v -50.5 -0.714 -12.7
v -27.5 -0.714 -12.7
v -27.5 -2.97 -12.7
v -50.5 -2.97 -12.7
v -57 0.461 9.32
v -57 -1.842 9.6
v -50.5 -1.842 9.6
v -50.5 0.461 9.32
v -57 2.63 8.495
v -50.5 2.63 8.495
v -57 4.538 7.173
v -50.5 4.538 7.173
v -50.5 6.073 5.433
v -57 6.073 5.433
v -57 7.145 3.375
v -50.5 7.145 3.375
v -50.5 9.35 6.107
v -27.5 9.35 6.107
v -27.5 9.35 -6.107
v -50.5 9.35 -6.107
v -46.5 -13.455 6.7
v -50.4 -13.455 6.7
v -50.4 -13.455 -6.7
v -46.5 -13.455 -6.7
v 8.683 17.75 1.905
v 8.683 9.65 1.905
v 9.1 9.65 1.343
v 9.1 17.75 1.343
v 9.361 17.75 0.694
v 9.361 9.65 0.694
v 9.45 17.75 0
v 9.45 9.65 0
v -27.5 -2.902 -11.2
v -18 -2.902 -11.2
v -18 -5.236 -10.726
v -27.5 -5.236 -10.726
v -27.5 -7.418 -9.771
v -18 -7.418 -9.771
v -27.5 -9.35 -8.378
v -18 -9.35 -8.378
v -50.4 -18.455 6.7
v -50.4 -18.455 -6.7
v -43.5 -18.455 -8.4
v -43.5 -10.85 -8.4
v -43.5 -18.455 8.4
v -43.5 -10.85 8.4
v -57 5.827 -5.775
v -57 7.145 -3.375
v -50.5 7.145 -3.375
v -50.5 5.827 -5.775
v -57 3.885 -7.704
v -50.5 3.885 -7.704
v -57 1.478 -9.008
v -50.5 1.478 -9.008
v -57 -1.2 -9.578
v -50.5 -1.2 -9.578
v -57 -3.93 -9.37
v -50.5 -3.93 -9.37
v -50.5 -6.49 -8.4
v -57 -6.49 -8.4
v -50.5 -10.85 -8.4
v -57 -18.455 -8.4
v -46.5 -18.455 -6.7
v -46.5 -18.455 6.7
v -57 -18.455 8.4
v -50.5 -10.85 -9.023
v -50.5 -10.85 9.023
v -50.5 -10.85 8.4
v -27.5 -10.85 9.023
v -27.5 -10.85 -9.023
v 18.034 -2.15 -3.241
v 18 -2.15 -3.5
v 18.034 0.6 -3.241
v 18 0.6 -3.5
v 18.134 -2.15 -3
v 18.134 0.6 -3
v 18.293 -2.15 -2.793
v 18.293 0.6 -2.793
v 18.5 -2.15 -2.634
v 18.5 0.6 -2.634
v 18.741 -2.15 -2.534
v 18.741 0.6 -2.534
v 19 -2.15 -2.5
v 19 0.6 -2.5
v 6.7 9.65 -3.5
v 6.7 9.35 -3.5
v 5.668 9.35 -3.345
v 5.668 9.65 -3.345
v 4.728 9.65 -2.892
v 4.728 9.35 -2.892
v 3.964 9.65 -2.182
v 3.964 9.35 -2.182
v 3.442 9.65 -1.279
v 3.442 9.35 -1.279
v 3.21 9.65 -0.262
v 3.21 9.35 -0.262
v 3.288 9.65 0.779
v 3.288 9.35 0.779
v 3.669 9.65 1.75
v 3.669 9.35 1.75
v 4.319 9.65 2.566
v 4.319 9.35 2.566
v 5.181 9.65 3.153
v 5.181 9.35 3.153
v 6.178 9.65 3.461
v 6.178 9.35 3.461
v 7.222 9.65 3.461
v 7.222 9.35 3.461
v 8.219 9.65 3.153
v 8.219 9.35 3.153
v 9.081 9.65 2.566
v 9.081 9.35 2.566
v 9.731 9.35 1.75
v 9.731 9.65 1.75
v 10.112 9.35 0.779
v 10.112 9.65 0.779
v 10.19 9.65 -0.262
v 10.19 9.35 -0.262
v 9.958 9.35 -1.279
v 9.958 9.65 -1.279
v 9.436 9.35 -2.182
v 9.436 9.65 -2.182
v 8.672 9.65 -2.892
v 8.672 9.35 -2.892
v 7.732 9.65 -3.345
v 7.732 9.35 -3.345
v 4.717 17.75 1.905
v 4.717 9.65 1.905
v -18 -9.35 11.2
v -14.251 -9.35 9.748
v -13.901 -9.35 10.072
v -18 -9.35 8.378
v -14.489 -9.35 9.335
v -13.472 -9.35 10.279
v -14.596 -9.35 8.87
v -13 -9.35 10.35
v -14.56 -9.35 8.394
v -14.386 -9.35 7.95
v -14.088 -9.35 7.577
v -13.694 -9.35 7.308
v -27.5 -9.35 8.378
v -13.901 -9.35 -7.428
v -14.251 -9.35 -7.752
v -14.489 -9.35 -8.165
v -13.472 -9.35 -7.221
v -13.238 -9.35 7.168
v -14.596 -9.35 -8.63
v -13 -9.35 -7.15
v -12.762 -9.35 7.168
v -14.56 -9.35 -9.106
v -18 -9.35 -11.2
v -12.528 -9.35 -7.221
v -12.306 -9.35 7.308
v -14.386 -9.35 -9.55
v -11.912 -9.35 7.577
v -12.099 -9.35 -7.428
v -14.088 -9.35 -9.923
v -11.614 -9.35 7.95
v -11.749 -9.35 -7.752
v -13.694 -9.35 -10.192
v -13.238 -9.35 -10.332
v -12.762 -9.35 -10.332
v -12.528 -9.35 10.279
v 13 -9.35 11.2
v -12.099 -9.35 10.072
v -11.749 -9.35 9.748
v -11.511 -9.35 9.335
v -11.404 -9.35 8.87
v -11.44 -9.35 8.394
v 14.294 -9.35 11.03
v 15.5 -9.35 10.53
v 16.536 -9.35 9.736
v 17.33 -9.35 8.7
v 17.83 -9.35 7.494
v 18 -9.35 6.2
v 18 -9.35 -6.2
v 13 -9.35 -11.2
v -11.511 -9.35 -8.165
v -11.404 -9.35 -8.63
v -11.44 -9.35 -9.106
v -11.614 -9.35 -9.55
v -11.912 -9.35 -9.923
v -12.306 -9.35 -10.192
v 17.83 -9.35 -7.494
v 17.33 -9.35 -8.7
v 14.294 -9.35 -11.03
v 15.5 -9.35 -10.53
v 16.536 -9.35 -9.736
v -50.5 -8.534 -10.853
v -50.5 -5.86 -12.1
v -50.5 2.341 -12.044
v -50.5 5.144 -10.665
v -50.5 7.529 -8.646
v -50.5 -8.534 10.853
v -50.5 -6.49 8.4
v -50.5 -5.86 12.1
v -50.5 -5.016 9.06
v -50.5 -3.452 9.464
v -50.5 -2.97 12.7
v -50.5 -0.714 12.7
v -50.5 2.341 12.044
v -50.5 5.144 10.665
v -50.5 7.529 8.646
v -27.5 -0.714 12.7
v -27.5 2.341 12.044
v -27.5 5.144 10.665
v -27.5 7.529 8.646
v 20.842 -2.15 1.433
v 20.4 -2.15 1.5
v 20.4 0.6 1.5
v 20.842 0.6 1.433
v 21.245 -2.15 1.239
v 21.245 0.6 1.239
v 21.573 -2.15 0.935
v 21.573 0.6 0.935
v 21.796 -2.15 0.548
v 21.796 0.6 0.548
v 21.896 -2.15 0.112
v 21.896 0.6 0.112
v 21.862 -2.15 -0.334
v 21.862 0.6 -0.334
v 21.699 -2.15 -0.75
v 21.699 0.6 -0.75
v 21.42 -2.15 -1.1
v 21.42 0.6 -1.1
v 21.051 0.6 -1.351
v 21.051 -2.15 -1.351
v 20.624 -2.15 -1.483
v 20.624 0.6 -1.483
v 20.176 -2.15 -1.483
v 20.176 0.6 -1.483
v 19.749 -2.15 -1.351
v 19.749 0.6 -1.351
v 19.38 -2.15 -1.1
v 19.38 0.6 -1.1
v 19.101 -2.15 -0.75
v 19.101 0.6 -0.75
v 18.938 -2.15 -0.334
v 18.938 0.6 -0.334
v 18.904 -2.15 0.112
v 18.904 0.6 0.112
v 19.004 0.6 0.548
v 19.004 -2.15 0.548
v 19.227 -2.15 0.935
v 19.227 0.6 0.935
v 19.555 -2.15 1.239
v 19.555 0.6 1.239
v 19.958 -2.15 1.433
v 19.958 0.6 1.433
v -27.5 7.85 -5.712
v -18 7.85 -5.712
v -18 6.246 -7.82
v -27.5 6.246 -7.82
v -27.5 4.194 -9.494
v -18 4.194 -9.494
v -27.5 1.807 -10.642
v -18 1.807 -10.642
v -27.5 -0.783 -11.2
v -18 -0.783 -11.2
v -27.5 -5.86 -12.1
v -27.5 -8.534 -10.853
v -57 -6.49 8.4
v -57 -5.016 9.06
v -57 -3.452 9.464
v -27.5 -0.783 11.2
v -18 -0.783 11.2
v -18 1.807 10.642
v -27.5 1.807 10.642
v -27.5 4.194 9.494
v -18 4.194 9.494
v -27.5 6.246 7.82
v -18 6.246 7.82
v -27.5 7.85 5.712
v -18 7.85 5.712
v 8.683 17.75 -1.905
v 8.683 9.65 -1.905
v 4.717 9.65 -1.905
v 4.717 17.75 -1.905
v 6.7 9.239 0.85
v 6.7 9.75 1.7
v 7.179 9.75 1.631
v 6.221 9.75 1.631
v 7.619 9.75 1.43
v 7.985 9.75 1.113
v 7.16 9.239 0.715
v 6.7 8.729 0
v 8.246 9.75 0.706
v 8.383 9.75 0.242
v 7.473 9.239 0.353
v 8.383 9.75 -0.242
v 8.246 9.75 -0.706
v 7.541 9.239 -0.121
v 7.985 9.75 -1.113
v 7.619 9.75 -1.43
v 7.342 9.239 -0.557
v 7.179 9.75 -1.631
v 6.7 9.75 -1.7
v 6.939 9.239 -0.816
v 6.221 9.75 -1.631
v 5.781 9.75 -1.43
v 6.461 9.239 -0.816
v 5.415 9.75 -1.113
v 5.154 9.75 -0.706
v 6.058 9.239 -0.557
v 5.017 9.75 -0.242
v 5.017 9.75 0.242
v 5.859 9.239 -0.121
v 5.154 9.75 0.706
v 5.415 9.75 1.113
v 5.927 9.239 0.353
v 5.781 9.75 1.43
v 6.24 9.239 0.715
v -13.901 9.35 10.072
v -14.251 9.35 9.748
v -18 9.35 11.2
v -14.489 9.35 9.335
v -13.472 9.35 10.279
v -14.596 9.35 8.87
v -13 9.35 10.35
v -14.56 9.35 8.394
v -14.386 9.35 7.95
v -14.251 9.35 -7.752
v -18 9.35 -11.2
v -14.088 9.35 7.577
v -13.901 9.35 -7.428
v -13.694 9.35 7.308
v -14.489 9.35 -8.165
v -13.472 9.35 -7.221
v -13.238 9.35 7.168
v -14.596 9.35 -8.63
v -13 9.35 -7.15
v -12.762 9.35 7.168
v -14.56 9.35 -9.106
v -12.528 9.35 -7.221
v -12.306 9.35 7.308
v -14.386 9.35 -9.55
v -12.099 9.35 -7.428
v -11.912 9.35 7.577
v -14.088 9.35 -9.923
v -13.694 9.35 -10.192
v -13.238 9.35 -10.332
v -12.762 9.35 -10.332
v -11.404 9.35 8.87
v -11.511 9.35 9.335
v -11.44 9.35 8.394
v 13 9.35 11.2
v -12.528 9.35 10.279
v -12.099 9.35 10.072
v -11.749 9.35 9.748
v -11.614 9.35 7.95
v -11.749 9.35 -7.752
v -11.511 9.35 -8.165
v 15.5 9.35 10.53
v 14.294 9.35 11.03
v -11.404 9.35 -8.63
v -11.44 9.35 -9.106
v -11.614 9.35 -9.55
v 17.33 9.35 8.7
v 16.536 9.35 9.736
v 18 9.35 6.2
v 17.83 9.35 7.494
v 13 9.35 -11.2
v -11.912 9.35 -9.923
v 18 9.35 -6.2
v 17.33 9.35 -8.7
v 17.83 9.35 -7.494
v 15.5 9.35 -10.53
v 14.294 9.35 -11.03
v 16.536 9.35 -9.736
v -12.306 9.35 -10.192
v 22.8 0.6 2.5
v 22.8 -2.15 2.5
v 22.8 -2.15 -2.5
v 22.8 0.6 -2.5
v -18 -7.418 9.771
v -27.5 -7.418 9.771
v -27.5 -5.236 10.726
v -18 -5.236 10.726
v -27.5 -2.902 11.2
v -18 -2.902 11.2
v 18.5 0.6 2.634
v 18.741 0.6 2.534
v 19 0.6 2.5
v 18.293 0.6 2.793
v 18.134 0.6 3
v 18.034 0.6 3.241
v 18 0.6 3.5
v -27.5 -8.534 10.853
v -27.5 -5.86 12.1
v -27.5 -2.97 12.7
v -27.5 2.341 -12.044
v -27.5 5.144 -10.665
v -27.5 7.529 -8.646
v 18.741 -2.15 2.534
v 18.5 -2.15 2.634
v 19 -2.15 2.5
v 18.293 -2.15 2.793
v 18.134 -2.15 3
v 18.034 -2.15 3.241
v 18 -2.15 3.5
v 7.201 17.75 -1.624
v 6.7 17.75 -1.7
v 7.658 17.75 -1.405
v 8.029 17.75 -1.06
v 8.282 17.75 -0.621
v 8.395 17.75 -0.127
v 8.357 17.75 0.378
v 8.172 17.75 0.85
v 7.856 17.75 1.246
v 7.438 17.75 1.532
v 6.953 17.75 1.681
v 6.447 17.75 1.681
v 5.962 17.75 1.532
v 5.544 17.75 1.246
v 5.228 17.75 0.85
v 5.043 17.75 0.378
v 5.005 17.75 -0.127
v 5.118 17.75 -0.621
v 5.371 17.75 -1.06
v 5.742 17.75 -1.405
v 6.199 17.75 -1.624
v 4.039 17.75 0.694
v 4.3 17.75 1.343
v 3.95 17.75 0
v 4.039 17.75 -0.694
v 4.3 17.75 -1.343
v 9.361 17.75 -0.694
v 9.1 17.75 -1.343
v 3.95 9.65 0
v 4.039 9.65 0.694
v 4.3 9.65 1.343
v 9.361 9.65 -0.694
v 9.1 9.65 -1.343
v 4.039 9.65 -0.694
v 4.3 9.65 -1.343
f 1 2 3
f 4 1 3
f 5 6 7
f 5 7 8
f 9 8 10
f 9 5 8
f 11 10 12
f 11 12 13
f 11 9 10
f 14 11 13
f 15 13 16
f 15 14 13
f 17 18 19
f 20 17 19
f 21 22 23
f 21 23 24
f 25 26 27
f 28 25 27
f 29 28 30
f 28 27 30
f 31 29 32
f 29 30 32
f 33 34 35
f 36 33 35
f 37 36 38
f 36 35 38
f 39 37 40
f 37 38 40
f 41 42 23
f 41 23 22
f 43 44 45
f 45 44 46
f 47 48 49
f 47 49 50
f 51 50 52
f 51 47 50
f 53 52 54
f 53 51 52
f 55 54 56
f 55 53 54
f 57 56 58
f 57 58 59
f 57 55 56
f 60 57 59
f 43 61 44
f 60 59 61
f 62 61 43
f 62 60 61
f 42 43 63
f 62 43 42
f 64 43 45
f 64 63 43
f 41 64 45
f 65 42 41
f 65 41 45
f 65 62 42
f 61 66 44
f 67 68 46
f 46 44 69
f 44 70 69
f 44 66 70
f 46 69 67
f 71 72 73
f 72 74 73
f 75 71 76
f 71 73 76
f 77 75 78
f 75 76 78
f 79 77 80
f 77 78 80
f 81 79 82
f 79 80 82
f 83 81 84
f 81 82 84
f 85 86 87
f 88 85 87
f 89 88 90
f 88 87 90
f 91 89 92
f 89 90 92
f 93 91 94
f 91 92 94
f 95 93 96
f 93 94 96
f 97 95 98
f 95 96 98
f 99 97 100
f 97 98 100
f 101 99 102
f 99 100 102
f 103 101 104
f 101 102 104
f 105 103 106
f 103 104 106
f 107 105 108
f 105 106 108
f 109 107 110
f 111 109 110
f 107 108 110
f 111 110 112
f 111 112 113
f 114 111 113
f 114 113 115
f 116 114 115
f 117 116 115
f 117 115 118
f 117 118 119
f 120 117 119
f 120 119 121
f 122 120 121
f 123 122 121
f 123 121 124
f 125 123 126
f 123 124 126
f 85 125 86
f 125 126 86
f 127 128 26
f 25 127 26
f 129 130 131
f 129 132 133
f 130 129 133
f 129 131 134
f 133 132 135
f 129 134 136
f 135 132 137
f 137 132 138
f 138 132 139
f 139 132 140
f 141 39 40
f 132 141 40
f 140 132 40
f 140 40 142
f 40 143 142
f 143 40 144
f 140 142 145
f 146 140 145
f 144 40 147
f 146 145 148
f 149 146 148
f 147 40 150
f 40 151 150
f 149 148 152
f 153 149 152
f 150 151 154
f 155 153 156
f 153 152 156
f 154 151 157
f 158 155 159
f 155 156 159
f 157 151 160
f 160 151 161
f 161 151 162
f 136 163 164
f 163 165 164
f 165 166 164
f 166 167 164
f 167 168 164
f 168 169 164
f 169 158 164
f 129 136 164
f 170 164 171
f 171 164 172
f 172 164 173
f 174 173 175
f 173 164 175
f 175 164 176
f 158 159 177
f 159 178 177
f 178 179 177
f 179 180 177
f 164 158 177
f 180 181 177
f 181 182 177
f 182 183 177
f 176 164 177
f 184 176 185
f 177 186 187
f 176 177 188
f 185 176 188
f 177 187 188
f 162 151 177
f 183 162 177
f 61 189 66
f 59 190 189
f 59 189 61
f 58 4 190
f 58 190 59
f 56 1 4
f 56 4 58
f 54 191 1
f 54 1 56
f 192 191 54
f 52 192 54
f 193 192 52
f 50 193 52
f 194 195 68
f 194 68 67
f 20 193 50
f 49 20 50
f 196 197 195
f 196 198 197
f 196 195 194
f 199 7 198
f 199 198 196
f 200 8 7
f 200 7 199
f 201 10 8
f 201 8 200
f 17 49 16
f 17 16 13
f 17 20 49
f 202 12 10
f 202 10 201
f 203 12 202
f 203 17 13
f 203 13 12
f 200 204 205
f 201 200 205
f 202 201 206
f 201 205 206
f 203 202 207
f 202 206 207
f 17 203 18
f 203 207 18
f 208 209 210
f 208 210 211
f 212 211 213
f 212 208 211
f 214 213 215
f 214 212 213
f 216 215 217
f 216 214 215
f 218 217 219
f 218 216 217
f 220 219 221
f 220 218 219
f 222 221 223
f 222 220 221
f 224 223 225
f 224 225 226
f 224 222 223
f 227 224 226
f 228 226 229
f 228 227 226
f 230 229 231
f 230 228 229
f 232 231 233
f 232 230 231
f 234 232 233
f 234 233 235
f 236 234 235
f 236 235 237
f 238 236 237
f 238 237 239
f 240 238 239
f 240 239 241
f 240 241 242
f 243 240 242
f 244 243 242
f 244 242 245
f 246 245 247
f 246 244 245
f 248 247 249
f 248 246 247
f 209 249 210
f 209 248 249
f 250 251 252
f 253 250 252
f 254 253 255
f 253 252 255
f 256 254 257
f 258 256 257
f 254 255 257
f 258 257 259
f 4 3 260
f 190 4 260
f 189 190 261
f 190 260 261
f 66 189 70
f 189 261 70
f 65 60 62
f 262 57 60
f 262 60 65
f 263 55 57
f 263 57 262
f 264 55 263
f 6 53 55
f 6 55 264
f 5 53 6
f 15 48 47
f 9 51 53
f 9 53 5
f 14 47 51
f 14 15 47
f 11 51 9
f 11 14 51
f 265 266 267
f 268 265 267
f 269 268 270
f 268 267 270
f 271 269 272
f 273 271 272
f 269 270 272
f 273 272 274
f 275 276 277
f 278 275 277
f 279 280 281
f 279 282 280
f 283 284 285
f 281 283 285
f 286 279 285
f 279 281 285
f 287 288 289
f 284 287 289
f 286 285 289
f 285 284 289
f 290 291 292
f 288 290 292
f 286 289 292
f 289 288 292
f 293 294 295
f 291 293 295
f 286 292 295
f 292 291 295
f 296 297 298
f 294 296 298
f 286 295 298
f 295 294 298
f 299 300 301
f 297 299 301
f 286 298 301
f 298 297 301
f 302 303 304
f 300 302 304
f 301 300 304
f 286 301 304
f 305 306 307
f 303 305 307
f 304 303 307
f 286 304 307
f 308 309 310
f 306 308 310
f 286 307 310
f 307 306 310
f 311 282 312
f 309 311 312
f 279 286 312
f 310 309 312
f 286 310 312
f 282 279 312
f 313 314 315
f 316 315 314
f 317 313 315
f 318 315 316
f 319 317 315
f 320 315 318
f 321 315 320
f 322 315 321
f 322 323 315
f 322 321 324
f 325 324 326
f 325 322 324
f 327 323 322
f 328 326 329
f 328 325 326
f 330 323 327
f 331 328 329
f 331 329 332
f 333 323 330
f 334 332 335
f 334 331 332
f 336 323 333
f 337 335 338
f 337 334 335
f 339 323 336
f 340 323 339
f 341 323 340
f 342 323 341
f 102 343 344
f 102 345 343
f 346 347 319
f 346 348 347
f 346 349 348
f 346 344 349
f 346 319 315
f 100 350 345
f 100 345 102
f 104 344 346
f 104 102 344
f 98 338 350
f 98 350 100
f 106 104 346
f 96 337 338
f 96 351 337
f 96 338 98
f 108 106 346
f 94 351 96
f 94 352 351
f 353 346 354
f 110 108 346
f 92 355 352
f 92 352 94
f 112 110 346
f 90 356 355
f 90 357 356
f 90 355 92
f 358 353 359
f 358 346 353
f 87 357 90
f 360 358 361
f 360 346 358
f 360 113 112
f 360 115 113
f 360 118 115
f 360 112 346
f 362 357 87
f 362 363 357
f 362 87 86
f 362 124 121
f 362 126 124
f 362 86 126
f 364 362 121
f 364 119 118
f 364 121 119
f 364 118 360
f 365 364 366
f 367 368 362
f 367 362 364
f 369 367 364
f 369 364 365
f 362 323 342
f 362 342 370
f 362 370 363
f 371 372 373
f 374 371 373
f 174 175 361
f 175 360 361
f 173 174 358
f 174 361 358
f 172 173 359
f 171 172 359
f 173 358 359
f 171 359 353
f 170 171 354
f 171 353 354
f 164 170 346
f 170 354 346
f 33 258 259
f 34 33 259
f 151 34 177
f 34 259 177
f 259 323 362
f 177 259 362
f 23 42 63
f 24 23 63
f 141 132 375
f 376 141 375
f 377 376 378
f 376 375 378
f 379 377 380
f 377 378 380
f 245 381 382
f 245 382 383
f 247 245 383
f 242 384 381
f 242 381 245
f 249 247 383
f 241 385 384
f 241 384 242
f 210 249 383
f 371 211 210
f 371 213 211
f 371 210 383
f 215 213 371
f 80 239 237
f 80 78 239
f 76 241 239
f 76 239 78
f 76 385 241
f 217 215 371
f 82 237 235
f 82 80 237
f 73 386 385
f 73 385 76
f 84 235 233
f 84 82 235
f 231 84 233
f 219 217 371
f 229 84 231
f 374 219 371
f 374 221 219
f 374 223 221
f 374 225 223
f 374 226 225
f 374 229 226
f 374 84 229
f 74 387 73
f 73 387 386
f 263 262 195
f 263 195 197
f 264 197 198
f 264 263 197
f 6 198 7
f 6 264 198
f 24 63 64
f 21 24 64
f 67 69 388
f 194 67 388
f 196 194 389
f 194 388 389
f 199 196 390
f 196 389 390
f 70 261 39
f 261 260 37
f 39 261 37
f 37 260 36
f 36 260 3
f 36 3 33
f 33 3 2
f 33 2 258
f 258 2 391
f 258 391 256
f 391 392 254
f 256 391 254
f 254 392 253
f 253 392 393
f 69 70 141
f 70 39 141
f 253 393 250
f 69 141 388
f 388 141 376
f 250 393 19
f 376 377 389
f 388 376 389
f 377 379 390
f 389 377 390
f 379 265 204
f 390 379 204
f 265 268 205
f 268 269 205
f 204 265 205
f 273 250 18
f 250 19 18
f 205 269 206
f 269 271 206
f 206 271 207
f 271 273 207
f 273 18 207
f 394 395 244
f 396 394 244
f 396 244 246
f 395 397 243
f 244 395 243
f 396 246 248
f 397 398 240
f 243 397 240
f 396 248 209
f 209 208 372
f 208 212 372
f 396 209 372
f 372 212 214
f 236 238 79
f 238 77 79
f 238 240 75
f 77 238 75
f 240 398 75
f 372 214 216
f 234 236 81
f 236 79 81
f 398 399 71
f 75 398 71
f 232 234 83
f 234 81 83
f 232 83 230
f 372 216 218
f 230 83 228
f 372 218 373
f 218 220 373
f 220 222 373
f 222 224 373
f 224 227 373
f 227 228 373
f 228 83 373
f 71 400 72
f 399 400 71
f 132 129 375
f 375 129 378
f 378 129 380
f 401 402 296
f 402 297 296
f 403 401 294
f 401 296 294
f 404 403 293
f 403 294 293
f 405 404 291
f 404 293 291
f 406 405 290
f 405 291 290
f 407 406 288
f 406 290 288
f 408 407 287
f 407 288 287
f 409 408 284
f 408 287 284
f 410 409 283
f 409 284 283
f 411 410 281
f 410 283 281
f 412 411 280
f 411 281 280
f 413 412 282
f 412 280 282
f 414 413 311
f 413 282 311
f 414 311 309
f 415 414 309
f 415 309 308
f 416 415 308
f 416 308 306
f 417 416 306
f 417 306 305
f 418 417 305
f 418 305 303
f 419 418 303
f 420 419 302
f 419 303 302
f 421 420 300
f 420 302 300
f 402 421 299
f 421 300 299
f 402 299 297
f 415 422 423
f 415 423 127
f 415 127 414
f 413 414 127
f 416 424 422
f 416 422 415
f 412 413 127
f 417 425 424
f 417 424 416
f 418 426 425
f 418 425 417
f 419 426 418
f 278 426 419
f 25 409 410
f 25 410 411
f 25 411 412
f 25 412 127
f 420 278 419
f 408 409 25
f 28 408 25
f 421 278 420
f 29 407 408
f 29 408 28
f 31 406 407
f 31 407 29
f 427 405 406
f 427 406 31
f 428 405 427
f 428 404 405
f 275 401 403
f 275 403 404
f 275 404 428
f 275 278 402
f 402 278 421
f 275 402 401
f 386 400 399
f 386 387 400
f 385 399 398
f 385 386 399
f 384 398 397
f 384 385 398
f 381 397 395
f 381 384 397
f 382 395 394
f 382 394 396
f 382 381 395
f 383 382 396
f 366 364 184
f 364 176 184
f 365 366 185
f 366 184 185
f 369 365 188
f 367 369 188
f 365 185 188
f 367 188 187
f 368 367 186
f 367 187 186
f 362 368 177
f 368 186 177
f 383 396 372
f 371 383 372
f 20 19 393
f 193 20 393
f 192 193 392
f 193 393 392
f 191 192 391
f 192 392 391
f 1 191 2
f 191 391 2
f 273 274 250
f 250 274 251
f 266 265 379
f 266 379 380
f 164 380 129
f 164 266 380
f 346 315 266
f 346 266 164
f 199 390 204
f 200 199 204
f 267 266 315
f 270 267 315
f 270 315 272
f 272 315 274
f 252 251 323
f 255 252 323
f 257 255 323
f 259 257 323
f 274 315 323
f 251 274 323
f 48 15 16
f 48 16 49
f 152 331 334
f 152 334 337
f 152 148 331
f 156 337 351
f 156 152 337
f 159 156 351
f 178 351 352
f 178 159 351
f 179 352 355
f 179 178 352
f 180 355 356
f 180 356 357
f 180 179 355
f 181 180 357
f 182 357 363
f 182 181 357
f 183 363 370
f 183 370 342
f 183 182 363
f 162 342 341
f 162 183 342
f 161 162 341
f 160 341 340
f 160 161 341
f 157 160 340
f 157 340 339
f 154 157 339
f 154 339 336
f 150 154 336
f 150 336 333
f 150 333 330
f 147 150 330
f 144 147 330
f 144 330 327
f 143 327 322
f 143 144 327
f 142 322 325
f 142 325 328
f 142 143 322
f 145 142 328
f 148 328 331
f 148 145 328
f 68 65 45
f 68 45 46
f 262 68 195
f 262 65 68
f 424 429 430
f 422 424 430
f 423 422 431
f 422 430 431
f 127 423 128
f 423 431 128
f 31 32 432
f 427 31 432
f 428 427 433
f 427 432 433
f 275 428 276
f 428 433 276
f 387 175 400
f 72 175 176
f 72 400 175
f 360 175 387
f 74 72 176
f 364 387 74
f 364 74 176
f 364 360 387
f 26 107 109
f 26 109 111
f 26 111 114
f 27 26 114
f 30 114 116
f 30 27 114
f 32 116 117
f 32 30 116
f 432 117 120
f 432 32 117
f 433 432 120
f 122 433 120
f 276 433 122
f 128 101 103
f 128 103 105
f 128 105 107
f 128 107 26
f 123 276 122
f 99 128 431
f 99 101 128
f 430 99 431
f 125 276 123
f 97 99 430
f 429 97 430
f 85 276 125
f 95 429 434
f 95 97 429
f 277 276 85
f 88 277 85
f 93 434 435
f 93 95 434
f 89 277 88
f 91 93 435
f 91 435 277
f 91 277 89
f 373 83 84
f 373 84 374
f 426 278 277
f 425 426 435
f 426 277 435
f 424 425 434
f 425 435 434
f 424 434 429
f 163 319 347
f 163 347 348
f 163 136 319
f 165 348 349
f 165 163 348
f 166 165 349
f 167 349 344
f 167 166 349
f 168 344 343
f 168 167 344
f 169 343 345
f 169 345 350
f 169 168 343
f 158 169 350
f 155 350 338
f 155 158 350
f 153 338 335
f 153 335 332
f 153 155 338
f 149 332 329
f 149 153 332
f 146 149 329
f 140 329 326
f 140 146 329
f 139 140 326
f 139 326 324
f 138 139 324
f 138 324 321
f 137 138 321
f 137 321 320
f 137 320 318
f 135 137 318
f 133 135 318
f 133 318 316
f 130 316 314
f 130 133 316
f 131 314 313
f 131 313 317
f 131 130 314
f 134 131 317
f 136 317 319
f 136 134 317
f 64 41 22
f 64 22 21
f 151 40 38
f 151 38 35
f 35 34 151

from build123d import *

# Parameters (mm, degrees)
SKETCH1_W                = 36
SKETCH1_H                = 22.4
SKETCH1_R                = 1.6
BOSS_EXTRUDE1_DEPTH      = 9.35
FILLET1_R                = 5
SKETCH2_R                = 3.5
BOSS_EXTRUDE2_DEPTH      = 0.3
BOSS_EXTRUDE4_START      = -0.3
BOSS_EXTRUDE4_DEPTH      = 8.4
M3_CLEARANCE_HOLE1_D     = 3.4
M3_CLEARANCE_HOLE1_DEPTH = 8.0000094
M3_CLEARANCE_HOLE1_TIP   = 1.021463052
BOSS_EXTRUDE5_DEPTH      = 9.5
BOSS_EXTRUDE6_DEPTH      = 23
BOSS_EXTRUDE7_DEPTH      = 13.5
SKETCH11_W               = 3.9
SKETCH11_H               = 13.4
CUT_EXTRUDE1_DEPTH       = 5
SKETCH13_W               = 4.8
SKETCH13_H               = 5
SKETCH13_R               = 1.5
BOSS_EXTRUDE8_DEPTH      = 2.75
FILLET2_R                = 1


with BuildPart() as part:
    # Sketch1 → Boss-Extrude1 (new, symmetric)
    with BuildSketch(Plane(origin=(0, 0, 0), x_dir=(1, 0, 0), z_dir=(0, 1, 0))):
        Rectangle(SKETCH1_W, SKETCH1_H)
        with Locations(Location((-13, 8.75, 0), (0, 0, 270))):
            Circle(SKETCH1_R, mode=Mode.SUBTRACT)
        with Locations(Location((-13, -8.75, 0), (0, 0, 270))):
            Circle(SKETCH1_R, mode=Mode.SUBTRACT)
    extrude(amount=BOSS_EXTRUDE1_DEPTH, both=True)

    # Fillet1
    fillet1_edges = [part.edges().sort_by_distance(p)[0] for p in [
        (18, 0, 11.2),
        (18, 0, -11.2),
    ]]
    fillet(fillet1_edges, radius=FILLET1_R)

    # Sketch2 → Boss-Extrude2 (add)
    with BuildSketch(Plane(origin=(0, 9.35, 0), x_dir=(1, 0, 0), z_dir=(0, 1, 0))):
        with Locations(Location((6.7, 0, 0), (0, 0, 90))):
            Circle(SKETCH2_R)
    extrude(amount=BOSS_EXTRUDE2_DEPTH)

    # Sketch3 → Boss-Extrude4 (add)
    with BuildSketch(Plane(origin=(0, 9.65, 0), x_dir=(1, 0, 0), z_dir=(0, 1, 0)).offset(BOSS_EXTRUDE4_START)):
        with BuildLine():
            ThreePointArc((4.716700981, 1.905), (4.148865713, 1.026749165), (3.95, 0))
            Line((3.95, 0), (9.45, 0))
            ThreePointArc((9.45, 0), (9.251134287, 1.026749165), (8.683299019, 1.905))
            Line((8.683299019, 1.905), (4.716700981, 1.905))
        make_face()
        with BuildLine():
            Line((9.45, 0), (3.95, 0))
            ThreePointArc((3.95, 0), (4.148865713, -1.026749165), (4.716700981, -1.905))
            Line((4.716700981, -1.905), (8.683299019, -1.905))
            ThreePointArc((8.683299019, -1.905), (9.251134287, -1.026749165), (9.45, 0))
        make_face()
    extrude(amount=BOSS_EXTRUDE4_DEPTH)

    # M3 Clearance Hole1
    with Locations(Plane(origin=(6.7, 17.75, 0), x_dir=(0, 0, 1), z_dir=(0, 1, 0))):
        with Locations((0, 0)):
            Hole(M3_CLEARANCE_HOLE1_D / 2, depth=M3_CLEARANCE_HOLE1_DEPTH)
            with Locations((0, 0, -(M3_CLEARANCE_HOLE1_DEPTH + M3_CLEARANCE_HOLE1_TIP / 2))):  # 118° drill point
                Cone(0, M3_CLEARANCE_HOLE1_D / 2, M3_CLEARANCE_HOLE1_TIP, mode=Mode.SUBTRACT)

    # Sketch7 → Boss-Extrude5 (add)
    with BuildSketch(Plane.ZY.offset(18)):
        with BuildLine():
            ThreePointArc((-11.2, -2.901648127), (-10.306415682, -6.352188829), (-8.378242386, -9.35))
            Line((-8.378242386, -9.35), (8.378242386, -9.35))
            ThreePointArc((8.378242386, -9.35), (10.306415682, -6.352188829), (11.2, -2.901648127))
            Line((11.2, -2.901648127), (11.2, -0.782686117))
            ThreePointArc((11.2, -0.782686117), (9.493833141, 4.193529382), (5.711776998, 7.85))
            Line((5.711776998, 7.85), (-5.711776998, 7.85))
            ThreePointArc((-5.711776998, 7.85), (-9.493833141, 4.193529382), (-11.2, -0.782686117))
            Line((-11.2, -0.782686117), (-11.2, -2.901648127))
        make_face()
    extrude(amount=BOSS_EXTRUDE5_DEPTH)

    # Sketch8 → Boss-Extrude6 (add)
    with BuildSketch(Plane.ZY.offset(27.5)):
        with BuildLine():
            Line((12.7, -2.97021854), (12.7, -0.714115705))
            ThreePointArc((12.7, -0.714115705), (10.665331767, 5.144477158), (6.107200268, 9.35))
            Line((6.107200268, 9.35), (-6.107200268, 9.35))
            ThreePointArc((-6.107200268, 9.35), (-10.665331767, 5.144477158), (-12.7, -0.714115705))
            Line((-12.7, -0.714115705), (-12.7, -2.97021854))
            ThreePointArc((-12.7, -2.97021854), (-11.554180407, -7.233216661), (-9.023383337, -10.85))
            Line((-9.023383337, -10.85), (9.023383337, -10.85))
            ThreePointArc((9.023383337, -10.85), (11.554180407, -7.233216661), (12.7, -2.97021854))
        make_face()
    extrude(amount=BOSS_EXTRUDE6_DEPTH)

    # Sketch9 → Boss-Extrude7 (add)
    with BuildSketch(Plane.ZY.offset(57.000000114)):
        with BuildLine():
            Line((-8.4, -1.842167122), (-8.4, -6.489747138))
            ThreePointArc((-8.4, -6.489747138), (0, -11.442167122), (8.4, -6.489747138))
            Line((8.4, -6.489747138), (8.4, -1.842167122))
            Line((8.4, -1.842167122), (-8.4, -1.842167122))
        make_face()
        with BuildLine():
            ThreePointArc((8.4, -6.489747138), (0, -11.442167122), (-8.4, -6.489747138))
            Line((-8.4, -6.489747138), (-8.4, -18.454988755))
            Line((-8.4, -18.454988755), (8.4, -18.454988755))
            Line((8.4, -18.454988755), (8.4, -6.489747138))
        make_face()
        with BuildLine():
            Line((3.375, 7.145011245), (-3.375, 7.145011245))
            ThreePointArc((-3.375, 7.145011245), (-9.007736413, 1.477574541), (-8.4, -6.489747138))
            Line((-8.4, -6.489747138), (-8.4, -1.842167122))
            Line((-8.4, -1.842167122), (8.4, -1.842167122))
            Line((8.4, -1.842167122), (8.4, -6.489747138))
            ThreePointArc((8.4, -6.489747138), (9.295160031, -4.242167122), (9.6, -1.842167122))
            ThreePointArc((9.6, -1.842167122), (7.891767863, 3.624093025), (3.375, 7.145011245))
        make_face()
    extrude(amount=-BOSS_EXTRUDE7_DEPTH)

    # Sketch11 → Cut-Extrude1 (cut)
    with BuildSketch(Plane.XZ.offset(18.454988755)):
        with Locations((-48.450000114, 0)):
            Rectangle(SKETCH11_W, SKETCH11_H)
    extrude(amount=-CUT_EXTRUDE1_DEPTH, mode=Mode.SUBTRACT)

    # Sketch13 → Boss-Extrude8 (add)
    with BuildSketch(Plane(origin=(0, -2.149999922, 0), x_dir=(1, 0, 0), z_dir=(0, 1, 0))):
        with Locations((20.4, 0)):
            Rectangle(SKETCH13_W, SKETCH13_H)
        with Locations(Location((20.4, 0, 0), (0, 0, 270))):
            Circle(SKETCH13_R, mode=Mode.SUBTRACT)
    extrude(amount=BOSS_EXTRUDE8_DEPTH)

    # Fillet2
    fillet2_edges = [part.edges().sort_by_distance(p)[0] for p in [
        (18, -0.774999922, -2.5),
        (18, -0.774999922, 2.5),
    ]]
    fillet(fillet2_edges, radius=FILLET2_R)


solid = part.part
